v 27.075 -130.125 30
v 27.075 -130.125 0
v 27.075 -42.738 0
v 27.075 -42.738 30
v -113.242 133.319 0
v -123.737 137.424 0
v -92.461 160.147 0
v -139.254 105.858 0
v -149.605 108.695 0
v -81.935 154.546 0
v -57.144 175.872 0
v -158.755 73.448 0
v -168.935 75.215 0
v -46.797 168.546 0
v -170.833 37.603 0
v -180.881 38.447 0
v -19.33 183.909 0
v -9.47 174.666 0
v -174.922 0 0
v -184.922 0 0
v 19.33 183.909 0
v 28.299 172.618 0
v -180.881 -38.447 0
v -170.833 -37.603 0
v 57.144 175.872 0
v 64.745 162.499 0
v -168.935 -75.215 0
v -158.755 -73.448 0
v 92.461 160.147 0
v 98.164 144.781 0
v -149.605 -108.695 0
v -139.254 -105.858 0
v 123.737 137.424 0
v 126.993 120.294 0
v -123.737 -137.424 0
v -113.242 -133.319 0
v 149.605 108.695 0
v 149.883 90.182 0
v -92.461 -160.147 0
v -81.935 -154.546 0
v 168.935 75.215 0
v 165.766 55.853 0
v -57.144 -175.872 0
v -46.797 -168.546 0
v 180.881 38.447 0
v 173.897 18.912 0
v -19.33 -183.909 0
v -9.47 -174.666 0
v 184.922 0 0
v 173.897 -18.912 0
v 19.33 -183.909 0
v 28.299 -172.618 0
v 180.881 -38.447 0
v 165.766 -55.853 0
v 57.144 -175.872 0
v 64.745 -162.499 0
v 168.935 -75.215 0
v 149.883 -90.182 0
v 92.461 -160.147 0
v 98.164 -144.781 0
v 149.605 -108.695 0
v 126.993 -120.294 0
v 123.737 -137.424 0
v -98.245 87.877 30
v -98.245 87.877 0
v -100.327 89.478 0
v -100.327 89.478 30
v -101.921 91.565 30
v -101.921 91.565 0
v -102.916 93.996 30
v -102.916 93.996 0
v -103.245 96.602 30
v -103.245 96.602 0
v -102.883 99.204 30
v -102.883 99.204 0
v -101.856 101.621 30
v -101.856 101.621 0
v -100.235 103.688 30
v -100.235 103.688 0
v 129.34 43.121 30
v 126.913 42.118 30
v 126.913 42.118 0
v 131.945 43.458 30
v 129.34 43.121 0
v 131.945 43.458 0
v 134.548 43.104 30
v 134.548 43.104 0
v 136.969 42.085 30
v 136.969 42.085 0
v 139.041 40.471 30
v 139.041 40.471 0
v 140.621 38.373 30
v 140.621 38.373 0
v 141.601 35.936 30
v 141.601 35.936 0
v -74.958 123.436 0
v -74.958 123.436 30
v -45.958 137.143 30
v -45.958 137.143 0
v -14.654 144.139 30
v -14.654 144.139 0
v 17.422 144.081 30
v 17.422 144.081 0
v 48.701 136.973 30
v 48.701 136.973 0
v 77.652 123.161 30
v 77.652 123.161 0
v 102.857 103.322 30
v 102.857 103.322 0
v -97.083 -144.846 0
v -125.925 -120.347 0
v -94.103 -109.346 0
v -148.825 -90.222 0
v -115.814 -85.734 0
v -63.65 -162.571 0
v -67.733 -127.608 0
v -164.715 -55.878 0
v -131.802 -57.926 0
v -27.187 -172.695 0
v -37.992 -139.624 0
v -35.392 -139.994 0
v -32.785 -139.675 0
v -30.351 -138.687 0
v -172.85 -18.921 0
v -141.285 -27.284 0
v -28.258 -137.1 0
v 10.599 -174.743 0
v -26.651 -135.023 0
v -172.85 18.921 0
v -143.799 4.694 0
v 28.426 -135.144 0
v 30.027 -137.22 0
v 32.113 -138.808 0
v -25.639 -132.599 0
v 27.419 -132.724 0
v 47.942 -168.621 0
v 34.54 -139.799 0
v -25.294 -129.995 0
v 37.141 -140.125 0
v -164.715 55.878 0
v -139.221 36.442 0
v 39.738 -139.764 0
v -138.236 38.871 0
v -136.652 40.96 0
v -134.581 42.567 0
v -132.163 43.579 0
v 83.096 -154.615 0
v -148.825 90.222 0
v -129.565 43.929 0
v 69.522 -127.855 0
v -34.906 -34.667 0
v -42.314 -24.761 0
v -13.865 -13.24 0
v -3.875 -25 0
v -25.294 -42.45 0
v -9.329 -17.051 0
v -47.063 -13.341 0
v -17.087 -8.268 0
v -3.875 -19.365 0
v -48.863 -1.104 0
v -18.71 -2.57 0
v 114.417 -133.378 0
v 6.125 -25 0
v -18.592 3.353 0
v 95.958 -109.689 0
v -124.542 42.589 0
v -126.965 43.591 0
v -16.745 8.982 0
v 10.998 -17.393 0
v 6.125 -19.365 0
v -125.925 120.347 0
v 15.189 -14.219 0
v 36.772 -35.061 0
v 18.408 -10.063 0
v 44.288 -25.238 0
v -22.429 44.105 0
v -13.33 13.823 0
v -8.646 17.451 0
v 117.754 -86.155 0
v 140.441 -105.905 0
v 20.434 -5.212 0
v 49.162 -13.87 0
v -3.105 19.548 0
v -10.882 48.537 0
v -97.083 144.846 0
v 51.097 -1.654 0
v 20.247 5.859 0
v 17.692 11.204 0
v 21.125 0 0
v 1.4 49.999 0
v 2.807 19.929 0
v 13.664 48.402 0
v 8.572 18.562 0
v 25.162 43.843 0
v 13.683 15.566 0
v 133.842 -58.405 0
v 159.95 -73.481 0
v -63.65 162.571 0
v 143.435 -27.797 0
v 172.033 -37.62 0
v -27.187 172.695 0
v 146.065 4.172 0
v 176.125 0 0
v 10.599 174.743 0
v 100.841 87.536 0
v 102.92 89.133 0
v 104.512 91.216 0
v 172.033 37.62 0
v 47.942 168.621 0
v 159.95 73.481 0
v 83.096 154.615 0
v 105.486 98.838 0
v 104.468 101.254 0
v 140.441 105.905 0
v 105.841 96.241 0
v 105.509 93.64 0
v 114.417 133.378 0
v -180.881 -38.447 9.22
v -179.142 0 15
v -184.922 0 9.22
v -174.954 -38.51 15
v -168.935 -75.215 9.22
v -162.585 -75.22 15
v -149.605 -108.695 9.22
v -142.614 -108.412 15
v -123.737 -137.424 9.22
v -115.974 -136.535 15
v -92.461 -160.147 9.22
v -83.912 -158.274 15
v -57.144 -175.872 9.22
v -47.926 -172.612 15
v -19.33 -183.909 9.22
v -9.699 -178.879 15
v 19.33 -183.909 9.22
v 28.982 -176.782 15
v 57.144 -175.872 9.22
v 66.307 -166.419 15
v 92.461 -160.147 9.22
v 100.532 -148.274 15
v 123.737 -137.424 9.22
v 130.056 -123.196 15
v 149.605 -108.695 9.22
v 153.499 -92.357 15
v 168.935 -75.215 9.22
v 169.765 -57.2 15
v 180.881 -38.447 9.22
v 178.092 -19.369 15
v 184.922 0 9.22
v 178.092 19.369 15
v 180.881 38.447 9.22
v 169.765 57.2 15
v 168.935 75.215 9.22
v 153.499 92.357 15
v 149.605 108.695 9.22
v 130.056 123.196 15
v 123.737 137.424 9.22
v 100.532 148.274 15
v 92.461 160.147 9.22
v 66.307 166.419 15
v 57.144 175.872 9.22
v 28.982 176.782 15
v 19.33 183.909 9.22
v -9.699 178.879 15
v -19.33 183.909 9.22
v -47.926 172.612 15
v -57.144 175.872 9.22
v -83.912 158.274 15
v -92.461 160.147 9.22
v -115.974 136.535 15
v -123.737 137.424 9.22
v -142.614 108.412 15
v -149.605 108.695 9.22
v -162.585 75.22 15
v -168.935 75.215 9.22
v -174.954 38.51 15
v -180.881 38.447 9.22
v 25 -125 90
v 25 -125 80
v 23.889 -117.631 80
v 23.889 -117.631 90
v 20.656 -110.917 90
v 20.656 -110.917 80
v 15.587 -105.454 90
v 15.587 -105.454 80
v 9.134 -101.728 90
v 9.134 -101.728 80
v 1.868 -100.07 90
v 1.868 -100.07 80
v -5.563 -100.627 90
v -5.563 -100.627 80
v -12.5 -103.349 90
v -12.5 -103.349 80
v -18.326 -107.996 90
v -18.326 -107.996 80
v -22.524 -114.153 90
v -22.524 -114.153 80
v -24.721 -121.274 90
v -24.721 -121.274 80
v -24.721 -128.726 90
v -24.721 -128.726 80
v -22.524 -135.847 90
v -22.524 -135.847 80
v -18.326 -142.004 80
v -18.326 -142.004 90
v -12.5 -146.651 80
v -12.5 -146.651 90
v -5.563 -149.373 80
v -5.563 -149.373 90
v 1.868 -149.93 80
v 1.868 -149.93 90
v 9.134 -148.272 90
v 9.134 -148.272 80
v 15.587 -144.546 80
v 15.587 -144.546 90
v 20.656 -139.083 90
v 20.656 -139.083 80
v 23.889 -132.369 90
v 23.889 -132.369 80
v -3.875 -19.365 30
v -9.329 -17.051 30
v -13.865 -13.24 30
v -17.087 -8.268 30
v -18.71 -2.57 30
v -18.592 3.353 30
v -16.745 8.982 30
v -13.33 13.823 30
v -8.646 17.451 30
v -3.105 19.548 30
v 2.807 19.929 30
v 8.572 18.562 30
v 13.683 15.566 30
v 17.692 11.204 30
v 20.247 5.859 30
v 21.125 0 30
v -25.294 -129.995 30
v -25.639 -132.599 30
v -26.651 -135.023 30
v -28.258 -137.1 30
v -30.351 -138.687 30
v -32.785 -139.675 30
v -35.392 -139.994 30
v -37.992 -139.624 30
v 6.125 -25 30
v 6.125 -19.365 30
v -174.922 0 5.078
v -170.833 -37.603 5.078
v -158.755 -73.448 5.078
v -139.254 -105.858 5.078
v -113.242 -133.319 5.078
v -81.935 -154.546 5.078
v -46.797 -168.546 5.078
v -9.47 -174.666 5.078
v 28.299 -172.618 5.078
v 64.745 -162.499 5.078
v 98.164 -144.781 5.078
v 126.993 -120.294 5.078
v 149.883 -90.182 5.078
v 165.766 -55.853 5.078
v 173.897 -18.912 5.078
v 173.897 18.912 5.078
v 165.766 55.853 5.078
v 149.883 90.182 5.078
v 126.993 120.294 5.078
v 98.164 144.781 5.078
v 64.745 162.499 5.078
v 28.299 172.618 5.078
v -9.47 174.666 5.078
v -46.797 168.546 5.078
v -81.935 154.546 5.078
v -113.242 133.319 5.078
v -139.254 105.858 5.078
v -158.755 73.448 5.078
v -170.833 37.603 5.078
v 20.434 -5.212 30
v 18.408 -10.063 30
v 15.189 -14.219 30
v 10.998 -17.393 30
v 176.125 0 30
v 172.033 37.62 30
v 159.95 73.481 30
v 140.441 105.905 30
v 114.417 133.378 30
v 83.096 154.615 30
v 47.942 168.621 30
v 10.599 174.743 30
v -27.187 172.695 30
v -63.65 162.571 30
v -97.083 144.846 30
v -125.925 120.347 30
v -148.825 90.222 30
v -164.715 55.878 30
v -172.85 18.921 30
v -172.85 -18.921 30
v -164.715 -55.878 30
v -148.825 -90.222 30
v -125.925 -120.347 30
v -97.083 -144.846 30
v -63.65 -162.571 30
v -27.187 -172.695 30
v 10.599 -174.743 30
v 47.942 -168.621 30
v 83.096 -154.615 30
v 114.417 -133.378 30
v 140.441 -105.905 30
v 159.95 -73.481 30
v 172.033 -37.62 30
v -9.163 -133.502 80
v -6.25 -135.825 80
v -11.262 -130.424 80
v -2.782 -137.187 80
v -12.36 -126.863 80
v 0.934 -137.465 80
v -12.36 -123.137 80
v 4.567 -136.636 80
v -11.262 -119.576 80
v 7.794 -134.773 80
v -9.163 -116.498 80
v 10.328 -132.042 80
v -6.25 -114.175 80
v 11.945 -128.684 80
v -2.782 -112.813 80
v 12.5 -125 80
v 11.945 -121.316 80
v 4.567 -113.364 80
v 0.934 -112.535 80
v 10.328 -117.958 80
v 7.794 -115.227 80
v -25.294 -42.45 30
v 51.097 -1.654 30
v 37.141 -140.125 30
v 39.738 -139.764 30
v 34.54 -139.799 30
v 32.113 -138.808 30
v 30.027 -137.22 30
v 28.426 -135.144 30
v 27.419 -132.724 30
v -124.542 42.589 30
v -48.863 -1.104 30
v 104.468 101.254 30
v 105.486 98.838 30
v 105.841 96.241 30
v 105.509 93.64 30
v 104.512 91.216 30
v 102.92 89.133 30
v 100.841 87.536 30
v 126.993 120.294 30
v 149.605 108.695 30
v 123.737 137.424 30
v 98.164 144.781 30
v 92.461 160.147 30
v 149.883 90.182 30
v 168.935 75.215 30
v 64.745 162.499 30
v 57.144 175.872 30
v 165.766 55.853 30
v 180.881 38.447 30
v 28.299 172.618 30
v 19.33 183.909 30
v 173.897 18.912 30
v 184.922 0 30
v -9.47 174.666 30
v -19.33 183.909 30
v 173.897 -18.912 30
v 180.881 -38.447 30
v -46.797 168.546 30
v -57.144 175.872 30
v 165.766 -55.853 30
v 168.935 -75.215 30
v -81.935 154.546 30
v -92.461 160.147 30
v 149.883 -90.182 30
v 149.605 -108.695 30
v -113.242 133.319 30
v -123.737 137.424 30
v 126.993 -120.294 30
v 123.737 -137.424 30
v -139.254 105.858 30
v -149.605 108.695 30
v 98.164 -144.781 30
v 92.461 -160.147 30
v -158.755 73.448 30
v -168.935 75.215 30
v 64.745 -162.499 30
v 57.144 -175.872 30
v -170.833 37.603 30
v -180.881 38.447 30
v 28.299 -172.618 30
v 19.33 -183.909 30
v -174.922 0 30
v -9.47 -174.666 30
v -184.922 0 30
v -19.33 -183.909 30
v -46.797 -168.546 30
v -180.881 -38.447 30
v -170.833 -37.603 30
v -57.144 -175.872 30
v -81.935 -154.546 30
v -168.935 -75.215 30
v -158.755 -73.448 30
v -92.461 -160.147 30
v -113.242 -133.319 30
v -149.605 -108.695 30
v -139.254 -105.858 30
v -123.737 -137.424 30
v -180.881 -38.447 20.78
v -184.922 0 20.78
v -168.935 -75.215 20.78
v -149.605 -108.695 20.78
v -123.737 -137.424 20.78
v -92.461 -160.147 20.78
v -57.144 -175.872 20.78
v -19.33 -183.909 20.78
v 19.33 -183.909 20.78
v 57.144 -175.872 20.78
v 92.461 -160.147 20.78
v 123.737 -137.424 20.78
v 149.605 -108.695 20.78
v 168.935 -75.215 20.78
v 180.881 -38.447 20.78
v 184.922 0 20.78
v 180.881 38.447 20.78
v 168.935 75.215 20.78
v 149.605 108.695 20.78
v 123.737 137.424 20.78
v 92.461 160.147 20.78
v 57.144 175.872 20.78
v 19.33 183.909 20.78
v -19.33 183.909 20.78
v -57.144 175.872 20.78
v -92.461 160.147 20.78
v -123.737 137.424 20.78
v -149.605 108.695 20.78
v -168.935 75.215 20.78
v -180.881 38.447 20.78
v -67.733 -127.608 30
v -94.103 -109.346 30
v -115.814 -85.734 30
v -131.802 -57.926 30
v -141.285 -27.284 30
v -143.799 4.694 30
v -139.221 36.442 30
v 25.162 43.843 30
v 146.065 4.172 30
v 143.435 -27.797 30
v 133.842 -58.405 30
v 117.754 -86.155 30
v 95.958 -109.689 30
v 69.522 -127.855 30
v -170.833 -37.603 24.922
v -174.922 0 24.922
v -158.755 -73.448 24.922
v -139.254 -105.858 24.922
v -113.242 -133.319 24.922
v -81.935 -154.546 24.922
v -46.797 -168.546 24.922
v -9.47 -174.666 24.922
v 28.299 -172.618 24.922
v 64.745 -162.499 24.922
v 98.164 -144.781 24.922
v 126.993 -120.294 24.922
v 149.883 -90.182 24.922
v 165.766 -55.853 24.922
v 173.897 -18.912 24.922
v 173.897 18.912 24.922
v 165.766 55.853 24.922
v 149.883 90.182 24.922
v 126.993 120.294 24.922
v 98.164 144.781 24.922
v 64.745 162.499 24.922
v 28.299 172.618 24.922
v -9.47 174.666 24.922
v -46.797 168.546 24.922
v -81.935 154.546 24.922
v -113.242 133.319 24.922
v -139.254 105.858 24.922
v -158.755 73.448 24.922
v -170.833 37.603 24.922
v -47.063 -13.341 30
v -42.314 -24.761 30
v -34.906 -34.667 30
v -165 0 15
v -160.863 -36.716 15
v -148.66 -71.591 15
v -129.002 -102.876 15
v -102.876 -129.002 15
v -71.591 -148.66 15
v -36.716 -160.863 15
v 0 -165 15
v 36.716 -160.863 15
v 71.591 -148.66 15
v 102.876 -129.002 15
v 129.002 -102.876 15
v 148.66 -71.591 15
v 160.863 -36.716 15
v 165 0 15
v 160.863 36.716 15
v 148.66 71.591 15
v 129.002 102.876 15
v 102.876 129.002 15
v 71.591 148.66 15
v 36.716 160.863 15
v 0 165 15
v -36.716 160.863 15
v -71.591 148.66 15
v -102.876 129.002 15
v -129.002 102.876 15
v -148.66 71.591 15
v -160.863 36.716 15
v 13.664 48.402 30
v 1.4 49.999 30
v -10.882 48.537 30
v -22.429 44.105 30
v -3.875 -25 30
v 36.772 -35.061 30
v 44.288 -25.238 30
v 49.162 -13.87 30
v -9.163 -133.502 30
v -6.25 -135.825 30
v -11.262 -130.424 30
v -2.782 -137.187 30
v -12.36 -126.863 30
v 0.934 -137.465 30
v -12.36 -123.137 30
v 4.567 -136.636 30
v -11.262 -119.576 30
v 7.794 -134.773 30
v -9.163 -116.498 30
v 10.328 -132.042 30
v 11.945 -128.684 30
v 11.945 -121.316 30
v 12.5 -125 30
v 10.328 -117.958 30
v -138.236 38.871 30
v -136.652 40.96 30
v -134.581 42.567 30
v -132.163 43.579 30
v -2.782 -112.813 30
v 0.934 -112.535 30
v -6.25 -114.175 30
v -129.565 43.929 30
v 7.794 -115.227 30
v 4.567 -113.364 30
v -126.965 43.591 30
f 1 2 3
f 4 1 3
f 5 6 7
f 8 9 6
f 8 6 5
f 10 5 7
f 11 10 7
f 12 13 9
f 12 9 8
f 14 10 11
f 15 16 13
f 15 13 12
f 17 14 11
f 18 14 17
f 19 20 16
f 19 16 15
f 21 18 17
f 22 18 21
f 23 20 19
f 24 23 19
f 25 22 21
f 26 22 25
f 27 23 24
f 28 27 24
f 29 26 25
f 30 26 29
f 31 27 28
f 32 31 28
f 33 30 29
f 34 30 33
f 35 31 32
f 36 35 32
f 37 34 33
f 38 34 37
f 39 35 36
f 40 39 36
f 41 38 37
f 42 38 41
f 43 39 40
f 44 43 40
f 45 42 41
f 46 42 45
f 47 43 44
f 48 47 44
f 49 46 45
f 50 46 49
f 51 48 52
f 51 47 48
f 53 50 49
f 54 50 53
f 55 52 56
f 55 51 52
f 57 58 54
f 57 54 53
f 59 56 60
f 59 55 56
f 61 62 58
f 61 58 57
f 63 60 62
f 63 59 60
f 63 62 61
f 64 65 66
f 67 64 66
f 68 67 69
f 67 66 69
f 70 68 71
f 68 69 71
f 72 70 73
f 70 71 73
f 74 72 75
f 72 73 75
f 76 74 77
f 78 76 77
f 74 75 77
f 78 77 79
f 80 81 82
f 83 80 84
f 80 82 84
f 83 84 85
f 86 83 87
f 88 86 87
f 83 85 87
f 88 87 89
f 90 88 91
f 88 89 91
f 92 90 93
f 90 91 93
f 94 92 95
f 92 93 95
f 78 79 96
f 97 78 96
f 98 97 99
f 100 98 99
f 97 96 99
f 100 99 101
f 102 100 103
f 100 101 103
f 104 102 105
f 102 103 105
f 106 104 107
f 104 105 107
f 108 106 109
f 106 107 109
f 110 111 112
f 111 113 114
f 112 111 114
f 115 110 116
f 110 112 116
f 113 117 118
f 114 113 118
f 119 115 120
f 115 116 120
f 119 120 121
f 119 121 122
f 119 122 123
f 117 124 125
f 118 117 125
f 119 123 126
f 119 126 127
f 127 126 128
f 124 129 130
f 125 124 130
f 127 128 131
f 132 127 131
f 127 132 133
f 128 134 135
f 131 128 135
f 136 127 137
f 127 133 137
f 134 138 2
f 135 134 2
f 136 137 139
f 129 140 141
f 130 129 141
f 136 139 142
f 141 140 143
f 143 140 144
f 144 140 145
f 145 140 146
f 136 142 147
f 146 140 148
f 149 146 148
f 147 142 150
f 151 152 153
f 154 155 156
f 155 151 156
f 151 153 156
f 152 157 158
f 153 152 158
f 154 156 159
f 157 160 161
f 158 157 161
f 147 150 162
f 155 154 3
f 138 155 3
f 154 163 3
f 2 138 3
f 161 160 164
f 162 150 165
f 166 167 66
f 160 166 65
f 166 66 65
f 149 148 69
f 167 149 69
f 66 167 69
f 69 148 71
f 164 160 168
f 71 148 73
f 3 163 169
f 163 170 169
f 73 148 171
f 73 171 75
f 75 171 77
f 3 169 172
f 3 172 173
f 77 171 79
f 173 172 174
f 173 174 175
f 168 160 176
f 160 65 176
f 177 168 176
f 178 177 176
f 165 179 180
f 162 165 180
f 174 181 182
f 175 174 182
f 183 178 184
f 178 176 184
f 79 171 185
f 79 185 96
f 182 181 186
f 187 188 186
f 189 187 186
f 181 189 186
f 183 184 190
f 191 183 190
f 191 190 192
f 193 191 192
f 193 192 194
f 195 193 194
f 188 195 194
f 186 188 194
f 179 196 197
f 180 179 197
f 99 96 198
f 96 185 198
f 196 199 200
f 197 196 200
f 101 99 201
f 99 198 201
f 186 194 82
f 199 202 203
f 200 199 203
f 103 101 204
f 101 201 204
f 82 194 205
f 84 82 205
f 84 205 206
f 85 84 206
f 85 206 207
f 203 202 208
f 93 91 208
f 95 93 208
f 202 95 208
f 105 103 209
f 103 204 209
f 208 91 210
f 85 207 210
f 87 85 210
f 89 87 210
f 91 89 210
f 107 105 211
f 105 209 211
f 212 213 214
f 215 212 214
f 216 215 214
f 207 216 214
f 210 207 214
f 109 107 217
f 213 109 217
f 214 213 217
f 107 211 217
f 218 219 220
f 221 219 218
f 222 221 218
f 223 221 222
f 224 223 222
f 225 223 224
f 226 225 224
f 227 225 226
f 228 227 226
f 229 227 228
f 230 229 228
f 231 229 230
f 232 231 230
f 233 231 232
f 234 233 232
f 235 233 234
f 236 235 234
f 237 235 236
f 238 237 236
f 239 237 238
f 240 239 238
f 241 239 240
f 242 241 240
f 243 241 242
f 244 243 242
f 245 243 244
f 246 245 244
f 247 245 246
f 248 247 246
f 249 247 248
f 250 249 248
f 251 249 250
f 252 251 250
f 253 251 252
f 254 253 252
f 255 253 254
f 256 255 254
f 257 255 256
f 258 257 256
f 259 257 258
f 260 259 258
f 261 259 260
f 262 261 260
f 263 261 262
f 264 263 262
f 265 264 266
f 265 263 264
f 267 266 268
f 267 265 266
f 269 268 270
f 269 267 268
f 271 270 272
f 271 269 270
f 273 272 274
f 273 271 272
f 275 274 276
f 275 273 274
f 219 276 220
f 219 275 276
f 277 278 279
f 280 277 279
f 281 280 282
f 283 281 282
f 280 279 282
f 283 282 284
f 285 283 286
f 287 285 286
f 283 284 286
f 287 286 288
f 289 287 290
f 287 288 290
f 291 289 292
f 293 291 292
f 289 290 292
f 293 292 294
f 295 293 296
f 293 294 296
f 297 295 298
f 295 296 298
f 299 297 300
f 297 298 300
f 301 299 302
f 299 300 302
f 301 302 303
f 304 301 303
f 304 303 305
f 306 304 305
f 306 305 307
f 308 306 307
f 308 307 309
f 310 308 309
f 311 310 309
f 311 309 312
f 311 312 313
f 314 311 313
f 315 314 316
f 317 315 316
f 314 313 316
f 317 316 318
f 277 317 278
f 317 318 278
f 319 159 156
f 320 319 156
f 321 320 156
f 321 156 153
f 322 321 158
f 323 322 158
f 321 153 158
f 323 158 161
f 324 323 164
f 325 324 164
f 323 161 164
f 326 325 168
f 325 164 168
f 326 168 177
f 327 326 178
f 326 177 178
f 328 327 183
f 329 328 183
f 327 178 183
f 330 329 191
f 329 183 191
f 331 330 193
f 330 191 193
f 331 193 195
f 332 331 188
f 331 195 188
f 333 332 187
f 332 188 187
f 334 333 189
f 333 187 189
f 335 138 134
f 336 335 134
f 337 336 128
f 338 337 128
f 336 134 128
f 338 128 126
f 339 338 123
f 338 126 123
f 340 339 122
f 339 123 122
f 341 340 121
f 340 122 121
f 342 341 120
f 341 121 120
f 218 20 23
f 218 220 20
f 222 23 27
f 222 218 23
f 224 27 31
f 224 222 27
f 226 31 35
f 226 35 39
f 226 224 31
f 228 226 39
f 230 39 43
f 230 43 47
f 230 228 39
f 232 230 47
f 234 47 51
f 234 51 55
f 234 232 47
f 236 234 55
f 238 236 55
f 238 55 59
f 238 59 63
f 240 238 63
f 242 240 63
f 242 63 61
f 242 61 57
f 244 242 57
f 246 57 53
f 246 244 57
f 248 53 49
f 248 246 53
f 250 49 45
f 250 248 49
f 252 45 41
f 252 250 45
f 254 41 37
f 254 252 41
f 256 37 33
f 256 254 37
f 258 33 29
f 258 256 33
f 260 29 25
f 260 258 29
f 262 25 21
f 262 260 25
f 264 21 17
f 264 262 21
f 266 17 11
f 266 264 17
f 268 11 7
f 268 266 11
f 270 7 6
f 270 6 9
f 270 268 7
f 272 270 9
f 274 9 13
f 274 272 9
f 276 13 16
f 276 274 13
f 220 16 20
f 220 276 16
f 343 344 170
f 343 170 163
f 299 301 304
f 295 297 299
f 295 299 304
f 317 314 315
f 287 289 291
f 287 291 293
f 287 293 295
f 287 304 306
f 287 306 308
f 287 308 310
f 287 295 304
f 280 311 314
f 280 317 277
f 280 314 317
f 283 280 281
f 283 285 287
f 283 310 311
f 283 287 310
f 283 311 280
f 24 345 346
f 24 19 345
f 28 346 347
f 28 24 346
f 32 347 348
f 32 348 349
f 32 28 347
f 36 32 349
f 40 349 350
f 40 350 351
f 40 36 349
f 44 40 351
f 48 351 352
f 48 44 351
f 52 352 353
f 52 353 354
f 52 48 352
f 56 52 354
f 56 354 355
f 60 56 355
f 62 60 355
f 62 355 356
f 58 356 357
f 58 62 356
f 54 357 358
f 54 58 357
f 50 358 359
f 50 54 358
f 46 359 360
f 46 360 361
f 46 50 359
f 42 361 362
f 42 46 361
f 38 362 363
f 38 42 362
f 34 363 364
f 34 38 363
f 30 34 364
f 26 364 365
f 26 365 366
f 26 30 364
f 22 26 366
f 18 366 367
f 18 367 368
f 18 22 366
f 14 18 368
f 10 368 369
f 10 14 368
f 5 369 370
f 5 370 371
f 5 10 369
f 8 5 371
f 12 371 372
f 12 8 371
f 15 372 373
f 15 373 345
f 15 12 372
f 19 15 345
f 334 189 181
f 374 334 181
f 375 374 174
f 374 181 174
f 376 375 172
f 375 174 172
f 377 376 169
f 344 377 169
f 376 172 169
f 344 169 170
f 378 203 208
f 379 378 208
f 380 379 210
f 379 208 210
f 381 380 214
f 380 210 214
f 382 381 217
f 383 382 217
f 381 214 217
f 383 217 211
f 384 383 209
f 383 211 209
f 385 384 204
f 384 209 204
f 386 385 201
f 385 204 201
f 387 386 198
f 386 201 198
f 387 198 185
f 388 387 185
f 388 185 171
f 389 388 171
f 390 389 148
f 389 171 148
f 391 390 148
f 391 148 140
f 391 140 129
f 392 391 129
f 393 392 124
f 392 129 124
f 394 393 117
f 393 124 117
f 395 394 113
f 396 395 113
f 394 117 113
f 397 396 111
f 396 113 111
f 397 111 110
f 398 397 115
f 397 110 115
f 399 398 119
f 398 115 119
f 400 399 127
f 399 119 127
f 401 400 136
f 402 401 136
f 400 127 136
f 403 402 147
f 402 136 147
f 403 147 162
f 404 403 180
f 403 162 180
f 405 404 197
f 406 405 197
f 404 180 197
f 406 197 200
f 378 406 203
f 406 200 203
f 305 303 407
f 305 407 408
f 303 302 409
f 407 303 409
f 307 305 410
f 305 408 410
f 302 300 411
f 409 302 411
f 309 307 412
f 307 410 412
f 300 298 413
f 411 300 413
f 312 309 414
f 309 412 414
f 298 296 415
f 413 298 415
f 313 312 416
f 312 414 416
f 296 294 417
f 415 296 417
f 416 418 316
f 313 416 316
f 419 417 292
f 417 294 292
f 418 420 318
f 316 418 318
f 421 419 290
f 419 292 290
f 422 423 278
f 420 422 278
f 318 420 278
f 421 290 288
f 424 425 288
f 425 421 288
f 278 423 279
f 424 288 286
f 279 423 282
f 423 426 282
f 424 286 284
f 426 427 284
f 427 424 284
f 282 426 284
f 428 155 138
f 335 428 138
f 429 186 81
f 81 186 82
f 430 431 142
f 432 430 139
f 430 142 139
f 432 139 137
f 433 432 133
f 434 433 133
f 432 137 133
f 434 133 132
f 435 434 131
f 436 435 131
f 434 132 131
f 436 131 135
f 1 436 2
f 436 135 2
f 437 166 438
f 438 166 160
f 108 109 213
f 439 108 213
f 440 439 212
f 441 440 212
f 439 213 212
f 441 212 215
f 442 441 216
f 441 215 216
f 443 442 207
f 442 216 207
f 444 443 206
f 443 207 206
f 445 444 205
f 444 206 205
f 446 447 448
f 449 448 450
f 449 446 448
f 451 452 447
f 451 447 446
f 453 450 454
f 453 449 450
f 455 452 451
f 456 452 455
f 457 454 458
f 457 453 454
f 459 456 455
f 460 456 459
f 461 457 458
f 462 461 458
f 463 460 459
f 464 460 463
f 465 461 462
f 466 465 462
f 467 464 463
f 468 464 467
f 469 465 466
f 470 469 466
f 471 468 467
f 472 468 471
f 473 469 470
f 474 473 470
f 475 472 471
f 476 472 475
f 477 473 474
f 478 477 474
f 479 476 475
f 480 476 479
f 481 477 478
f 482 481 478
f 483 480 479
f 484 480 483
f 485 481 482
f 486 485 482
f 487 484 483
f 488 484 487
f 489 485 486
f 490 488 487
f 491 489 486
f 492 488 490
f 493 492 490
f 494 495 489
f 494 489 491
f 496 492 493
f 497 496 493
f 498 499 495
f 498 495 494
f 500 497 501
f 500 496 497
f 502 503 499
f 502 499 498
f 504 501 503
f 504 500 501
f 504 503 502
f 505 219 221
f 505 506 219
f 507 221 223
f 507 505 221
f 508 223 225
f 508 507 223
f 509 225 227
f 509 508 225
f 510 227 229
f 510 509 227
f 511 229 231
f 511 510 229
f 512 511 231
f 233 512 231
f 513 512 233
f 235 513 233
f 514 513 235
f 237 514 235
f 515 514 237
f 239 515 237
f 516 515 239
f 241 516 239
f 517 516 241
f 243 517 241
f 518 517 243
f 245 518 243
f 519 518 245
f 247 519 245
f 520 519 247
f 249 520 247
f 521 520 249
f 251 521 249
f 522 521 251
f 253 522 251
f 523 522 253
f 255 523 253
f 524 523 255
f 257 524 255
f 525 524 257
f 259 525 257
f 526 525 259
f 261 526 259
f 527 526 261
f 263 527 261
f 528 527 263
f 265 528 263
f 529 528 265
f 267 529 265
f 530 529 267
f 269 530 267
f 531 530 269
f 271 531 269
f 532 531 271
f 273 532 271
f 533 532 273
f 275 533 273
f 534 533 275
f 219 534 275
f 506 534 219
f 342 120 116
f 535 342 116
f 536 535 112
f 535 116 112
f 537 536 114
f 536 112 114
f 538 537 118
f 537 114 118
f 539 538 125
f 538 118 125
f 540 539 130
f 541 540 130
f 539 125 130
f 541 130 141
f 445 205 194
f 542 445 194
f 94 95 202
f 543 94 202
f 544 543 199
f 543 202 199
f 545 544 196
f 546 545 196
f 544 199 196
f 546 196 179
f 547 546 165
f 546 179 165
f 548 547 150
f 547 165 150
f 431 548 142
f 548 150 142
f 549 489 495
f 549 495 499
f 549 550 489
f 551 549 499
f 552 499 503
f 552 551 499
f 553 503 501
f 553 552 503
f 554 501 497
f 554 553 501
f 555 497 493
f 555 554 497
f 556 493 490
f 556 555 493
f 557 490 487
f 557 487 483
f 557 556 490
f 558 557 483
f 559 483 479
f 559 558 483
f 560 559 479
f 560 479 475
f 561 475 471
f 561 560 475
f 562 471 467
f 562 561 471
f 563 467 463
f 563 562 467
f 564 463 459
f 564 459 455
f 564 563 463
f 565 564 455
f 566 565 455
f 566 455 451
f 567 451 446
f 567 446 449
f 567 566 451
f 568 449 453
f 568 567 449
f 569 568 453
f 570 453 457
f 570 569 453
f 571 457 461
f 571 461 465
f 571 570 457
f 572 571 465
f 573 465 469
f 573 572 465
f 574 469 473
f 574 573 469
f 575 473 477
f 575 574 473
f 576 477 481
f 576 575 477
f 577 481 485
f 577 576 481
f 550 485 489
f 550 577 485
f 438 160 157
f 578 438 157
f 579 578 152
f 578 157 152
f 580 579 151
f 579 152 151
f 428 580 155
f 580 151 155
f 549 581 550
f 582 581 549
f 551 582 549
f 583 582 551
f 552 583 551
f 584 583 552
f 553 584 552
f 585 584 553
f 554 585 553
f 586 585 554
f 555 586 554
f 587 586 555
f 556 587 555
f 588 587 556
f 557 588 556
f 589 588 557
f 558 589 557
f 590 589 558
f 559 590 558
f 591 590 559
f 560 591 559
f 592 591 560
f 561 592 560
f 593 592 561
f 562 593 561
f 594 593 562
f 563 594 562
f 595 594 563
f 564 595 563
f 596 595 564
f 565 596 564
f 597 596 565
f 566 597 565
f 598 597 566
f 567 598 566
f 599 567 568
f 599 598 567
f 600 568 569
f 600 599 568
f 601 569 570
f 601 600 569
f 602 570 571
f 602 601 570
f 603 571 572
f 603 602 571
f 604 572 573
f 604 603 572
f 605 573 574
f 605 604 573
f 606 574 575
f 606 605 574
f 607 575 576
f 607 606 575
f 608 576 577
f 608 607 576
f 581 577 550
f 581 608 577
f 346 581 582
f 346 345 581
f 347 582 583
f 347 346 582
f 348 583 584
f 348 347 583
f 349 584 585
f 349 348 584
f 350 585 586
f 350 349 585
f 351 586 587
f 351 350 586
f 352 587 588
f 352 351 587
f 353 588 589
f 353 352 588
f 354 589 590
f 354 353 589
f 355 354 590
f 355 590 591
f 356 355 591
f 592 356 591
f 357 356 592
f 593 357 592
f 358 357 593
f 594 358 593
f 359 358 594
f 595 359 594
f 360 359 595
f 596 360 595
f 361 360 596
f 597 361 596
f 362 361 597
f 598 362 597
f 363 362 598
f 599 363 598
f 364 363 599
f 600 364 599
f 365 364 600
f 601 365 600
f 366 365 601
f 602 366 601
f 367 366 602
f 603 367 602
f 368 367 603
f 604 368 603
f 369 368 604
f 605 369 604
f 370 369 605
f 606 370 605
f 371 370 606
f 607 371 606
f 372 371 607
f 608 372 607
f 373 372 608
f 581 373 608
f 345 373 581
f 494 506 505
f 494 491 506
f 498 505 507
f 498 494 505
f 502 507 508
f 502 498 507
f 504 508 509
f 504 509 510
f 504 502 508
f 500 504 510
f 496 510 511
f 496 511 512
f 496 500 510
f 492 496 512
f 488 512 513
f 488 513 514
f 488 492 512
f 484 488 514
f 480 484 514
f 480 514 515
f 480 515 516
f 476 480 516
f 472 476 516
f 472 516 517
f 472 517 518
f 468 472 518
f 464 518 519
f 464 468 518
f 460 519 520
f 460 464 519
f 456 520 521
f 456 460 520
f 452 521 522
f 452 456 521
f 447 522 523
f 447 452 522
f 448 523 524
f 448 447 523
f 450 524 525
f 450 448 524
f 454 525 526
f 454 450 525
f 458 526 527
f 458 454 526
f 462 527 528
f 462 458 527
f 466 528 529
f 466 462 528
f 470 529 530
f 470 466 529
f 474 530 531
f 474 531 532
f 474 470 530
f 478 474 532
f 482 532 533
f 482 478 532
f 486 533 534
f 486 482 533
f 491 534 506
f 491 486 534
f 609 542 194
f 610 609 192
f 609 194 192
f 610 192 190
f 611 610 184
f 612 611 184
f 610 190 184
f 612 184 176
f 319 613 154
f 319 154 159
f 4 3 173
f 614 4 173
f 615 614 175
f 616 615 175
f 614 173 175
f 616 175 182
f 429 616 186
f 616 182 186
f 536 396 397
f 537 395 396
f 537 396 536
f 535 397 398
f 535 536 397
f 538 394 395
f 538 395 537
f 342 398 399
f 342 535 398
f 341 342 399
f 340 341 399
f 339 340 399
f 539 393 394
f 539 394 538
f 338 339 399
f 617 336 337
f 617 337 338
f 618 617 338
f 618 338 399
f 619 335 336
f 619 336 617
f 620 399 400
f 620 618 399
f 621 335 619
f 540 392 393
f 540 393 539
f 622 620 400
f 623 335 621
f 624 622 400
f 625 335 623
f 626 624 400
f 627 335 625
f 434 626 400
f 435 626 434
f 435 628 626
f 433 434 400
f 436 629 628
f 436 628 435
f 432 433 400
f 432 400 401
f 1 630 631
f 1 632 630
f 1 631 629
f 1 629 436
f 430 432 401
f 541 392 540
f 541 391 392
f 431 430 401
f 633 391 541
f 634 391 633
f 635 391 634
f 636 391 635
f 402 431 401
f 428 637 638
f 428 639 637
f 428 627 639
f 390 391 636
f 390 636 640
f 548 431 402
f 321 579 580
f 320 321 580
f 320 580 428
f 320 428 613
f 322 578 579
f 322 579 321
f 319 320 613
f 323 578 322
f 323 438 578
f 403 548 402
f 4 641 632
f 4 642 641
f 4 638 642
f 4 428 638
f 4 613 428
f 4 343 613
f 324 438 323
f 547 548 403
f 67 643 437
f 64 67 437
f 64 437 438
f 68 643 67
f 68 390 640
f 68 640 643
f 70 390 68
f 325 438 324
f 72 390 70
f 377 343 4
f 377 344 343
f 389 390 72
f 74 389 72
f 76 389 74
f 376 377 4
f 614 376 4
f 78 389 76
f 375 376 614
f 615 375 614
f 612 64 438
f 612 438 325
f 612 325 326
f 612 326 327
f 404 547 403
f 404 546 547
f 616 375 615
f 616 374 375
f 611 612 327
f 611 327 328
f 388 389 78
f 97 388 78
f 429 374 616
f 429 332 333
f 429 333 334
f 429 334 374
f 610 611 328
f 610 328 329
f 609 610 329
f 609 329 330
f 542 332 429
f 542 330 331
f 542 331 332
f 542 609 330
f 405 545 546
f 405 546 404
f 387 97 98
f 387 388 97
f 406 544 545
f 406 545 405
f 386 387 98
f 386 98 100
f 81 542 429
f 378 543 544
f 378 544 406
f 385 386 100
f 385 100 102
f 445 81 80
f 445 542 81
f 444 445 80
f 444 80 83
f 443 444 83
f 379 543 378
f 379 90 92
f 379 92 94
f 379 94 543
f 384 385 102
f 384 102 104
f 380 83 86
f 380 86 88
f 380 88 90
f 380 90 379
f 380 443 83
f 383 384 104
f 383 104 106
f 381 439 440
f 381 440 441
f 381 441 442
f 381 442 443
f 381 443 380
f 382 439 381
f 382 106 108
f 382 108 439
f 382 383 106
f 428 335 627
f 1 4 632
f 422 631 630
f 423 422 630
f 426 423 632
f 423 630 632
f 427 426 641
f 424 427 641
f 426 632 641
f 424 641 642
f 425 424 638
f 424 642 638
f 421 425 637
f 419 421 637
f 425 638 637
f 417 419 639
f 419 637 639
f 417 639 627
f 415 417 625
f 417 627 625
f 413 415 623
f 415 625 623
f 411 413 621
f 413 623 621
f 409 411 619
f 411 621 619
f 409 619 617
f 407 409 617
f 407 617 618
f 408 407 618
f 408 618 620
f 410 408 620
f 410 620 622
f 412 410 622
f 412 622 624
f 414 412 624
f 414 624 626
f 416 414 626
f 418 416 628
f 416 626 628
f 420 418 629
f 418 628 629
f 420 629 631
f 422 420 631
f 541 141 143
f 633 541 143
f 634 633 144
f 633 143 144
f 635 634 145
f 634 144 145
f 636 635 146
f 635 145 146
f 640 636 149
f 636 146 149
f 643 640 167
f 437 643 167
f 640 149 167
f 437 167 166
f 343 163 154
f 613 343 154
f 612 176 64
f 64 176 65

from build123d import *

# Parameters (mm, degrees)
SKETCH1_R           = 175
BOSS_EXTRUDE1_DEPTH = 30
SKETCH2_R           = 12.5
BOSS_EXTRUDE2_DEPTH = 50
SKETCH3_R           = 25
BOSS_EXTRUDE3_DEPTH = 10


with BuildPart() as part:
    # Sketch1 → Boss-Extrude1 (new body)
    with BuildSketch(Plane.XY):
        with Locations((1.124570284, 0)):
            Circle(SKETCH1_R)
        with BuildLine():
            Line((-25.294489225, -42.450362715), (-25.294489225, -129.994815683))
            ThreePointArc((-25.294489225, -129.994815683), (-29.252017923, -137.962785347), (-37.992197337, -139.624061289))
            ThreePointArc((-37.992197337, -139.624061289), (-124.579527681, -72.273644953), (-139.221399367, 36.441855094))
            ThreePointArc((-139.221399367, 36.441855094), (-133.404983694, 43.152516168), (-124.542366978, 42.588877746))
            Line((-124.542366978, 42.588877746), (-48.863229184, -1.104492831))
            ThreePointArc((-48.863229184, -1.104492831), (-42.313572676, -24.761416281), (-25.294489225, -42.450362715))
        make_face(mode=Mode.SUBTRACT)
        with BuildLine():
            Line((27.074988868, -130.125198957), (27.074988868, -42.738457802))
            ThreePointArc((27.074988868, -42.738457802), (44.287657296, -25.237827156), (51.09719255, -1.654395321))
            Line((51.09719255, -1.654395321), (126.91291278, 42.117831162))
            ThreePointArc((126.91291278, 42.117831162), (135.792141274, 42.674495606), (141.60093815, 35.935916171))
            ThreePointArc((141.60093815, 35.935916171), (126.567431819, -72.726119721), (39.737982837, -139.764102584))
            ThreePointArc((39.737982837, -139.764102584), (31.018172034, -138.082269388), (27.074988868, -130.125198957))
        make_face(mode=Mode.SUBTRACT)
        with BuildLine():
            ThreePointArc((21.124570284, 0), (16.935958585, -12.247448714), (6.124570284, -19.364916731))
            Line((6.124570284, -19.364916731), (6.124570284, -25))
            Line((6.124570284, -25), (-3.875429716, -25))
            Line((-3.875429716, -25), (-3.875429716, -19.364916731))
            ThreePointArc((-3.875429716, -19.364916731), (-11.12287843, 15.811388301), (21.124570284, 0))
        make_face(mode=Mode.SUBTRACT)
        with BuildLine():
            Line((-22.428992473, 44.104758037), (-98.244712703, 87.876984521))
            ThreePointArc((-98.244712703, 87.876984521), (-103.1664125, 95.288289741), (-100.235029962, 103.688145118))
            ThreePointArc((-100.235029962, 103.688145118), (1.385806713, 144.999764674), (102.857127382, 103.322247489))
            ThreePointArc((102.857127382, 103.322247489), (105.760522511, 94.929753221), (100.841088961, 87.536321211))
            Line((100.841088961, 87.536321211), (25.161951167, 43.842950634))
            ThreePointArc((25.161951167, 43.842950634), (1.399626231, 49.999243437), (-22.428992473, 44.104758037))
        make_face(mode=Mode.SUBTRACT)
    extrude(amount=BOSS_EXTRUDE1_DEPTH)

    # Sketch2 → Boss-Extrude2 (add)
    with BuildSketch(Plane.XY.offset(30)):
        with Locations((0, -125)):
            Circle(SKETCH2_R)
    extrude(amount=BOSS_EXTRUDE2_DEPTH)

    # Sketch3 → Boss-Extrude3 (add)
    with BuildSketch(Plane.XY.offset(80)):
        with Locations((0, -125)):
            Circle(SKETCH3_R)
    extrude(amount=BOSS_EXTRUDE3_DEPTH)


with BuildPart() as body_2:
    # Sketch5 → Revolve-Thin11 (revolve)
    with BuildSketch(Plane(origin=(0, 0, 0), x_dir=(0, 0, -1), z_dir=(1, 0, 0)), mode=Mode.PRIVATE) as revolve_thin11_sk:
        Polygon((-30, 174.922248704), (-24.922248704, 174.922248704), (-15, 165), (-5.077751296, 174.922248704), (0, 174.922248704), (0, 184.922248704), (-9.21988692, 184.922248704), (-15, 179.142135624), (-20.78011308, 184.922248704), (-30, 184.922248704), align=None)
    revolve(revolve_thin11_sk.sketch.rotate(Axis((0, 0, 0), (0, 0, 1)), 90), axis=Axis((0, 0, 0), (0, 0, 1)))


solid = Compound([part.part, body_2.part])
